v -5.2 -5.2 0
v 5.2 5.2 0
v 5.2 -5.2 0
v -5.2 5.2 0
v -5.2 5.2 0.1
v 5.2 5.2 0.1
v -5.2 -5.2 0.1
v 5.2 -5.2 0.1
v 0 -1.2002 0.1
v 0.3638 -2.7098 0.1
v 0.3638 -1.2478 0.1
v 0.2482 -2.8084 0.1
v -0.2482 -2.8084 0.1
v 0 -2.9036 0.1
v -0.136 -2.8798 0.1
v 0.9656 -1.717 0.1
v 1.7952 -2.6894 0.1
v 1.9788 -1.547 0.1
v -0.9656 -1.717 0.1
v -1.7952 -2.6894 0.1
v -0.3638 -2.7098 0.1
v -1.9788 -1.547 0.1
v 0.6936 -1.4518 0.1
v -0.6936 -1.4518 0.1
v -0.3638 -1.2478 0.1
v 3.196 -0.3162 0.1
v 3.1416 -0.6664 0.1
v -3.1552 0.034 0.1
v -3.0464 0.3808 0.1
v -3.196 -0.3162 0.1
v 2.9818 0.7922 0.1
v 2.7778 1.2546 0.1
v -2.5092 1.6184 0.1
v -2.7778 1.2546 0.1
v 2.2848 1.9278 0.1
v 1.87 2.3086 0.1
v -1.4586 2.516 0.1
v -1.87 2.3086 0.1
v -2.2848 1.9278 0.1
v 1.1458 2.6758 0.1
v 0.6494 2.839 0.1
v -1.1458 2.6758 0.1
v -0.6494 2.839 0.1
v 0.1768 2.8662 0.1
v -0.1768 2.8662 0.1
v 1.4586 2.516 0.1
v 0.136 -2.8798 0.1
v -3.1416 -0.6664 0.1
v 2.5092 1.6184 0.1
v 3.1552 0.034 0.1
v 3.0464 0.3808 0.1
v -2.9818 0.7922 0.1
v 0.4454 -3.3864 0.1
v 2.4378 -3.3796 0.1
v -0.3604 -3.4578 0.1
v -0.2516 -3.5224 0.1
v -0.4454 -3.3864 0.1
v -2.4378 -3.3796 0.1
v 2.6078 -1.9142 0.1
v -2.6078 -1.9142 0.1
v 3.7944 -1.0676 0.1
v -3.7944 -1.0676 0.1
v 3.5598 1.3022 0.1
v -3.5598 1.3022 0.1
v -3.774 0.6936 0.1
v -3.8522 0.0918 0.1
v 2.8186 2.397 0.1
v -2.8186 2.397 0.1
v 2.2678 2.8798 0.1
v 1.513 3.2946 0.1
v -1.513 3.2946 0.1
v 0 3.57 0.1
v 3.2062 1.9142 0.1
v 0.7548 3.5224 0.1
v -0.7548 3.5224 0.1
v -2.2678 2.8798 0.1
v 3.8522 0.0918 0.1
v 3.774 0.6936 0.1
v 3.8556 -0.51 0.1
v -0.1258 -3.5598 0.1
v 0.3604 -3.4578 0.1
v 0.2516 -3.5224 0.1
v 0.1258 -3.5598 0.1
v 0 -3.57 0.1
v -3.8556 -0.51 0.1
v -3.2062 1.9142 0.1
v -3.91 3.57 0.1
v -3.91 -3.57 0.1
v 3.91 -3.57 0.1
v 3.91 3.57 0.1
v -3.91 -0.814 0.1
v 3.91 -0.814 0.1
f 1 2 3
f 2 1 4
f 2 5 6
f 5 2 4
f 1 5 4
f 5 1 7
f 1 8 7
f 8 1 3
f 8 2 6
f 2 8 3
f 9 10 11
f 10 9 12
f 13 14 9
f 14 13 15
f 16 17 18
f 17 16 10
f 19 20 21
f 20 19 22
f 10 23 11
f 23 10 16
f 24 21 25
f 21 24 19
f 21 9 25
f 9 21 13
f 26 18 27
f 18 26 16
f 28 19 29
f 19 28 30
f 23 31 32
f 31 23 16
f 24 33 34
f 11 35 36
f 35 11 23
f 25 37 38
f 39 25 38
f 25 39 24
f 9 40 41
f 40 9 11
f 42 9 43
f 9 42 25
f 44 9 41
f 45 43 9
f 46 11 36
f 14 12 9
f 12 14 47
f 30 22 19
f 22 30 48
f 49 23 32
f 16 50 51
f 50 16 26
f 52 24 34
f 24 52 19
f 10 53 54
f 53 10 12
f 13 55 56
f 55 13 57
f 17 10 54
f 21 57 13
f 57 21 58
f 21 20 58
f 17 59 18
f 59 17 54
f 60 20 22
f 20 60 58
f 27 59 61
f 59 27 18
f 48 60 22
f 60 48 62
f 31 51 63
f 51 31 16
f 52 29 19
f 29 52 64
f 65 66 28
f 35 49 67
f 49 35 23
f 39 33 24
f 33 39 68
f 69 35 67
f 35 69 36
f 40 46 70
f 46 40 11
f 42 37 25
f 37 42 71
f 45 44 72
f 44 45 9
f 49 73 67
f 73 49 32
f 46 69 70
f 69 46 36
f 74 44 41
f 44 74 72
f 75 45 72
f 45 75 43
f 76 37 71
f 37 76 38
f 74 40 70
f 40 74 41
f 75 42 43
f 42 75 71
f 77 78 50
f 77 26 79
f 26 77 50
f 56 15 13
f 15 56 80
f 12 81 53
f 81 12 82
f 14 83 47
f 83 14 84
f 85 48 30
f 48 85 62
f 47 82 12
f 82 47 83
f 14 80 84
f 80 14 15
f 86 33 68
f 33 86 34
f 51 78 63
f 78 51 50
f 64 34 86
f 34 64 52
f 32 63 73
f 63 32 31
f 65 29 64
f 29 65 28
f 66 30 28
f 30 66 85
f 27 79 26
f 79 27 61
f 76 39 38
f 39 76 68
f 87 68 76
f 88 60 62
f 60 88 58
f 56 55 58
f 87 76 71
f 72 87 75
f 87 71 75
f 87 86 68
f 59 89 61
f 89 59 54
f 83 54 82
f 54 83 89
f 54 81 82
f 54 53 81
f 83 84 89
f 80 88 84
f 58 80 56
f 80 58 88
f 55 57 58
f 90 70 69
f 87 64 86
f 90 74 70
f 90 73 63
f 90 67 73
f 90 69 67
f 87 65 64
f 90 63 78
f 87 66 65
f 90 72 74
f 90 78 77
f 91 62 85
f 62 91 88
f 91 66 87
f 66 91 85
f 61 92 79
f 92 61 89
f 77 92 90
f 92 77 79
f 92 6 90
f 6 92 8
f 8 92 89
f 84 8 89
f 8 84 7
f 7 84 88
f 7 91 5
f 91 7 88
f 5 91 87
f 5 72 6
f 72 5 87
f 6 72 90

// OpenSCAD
// file: ../p/4-4edge.scad
use <../lib.scad>
$fa=1; $fs=0.2;
function ldraw_lib__4_4edge(realsolid=false) = [
// 0 Circle 1.0
// 0 Name: 4-4edge.dat
// 0 Author: James Jessiman
// 0 !LDRAW_ORG Primitive UPDATE 2017-01
// 0 !LICENSE Licensed under CC BY 2.0 and CC BY 4.0 : see CAreadme.txt
// 
// 0 BFC CERTIFY CCW
  [0,"BFC","CERTIFY"],
  [0,"BFC","CCW"],
// 
// 0 !HISTORY 1998-12-15 [PTadmin] Official Update 1998-10
// 0 !HISTORY 2005-12-28 [PTadmin] Official Update 2005-01
// 0 !HISTORY 2007-06-24 [PTadmin] Header formatted for Contributor Agreement
// 0 !HISTORY 2008-07-01 [PTadmin] Official Update 2008-01
// 0 !HISTORY 2017-01-15 [Steffen] BFCed
// 0 !HISTORY 2017-12-30 [PTadmin] Official Update 2017-01
// 
// 
// 2 24 1 0 0 0.9239 0 0.3827
  [2,24,1,0,0,0.9239,0,0.3827],
// 2 24 0.9239 0 0.3827 0.7071 0 0.7071
  [2,24,0.9239,0,0.3827,0.7071,0,0.7071],
// 2 24 0.7071 0 0.7071 0.3827 0 0.9239
  [2,24,0.7071,0,0.7071,0.3827,0,0.9239],
// 2 24 0.3827 0 0.9239 0 0 1
  [2,24,0.3827,0,0.9239,0,0,1],
// 2 24 0 0 1 -0.3827 0 0.9239
  [2,24,0,0,1,-0.3827,0,0.9239],
// 2 24 -0.3827 0 0.9239 -0.7071 0 0.7071
  [2,24,-0.3827,0,0.9239,-0.7071,0,0.7071],
// 2 24 -0.7071 0 0.7071 -0.9239 0 0.3827
  [2,24,-0.7071,0,0.7071,-0.9239,0,0.3827],
// 2 24 -0.9239 0 0.3827 -1 0 -0
  [2,24,-0.9239,0,0.3827,-1,0,-0],
// 2 24 -1 0 -0 -0.9239 0 -0.3827
  [2,24,-1,0,-0,-0.9239,0,-0.3827],
// 2 24 -0.9239 0 -0.3827 -0.7071 0 -0.7071
  [2,24,-0.9239,0,-0.3827,-0.7071,0,-0.7071],
// 2 24 -0.7071 0 -0.7071 -0.3827 0 -0.9239
  [2,24,-0.7071,0,-0.7071,-0.3827,0,-0.9239],
// 2 24 -0.3827 0 -0.9239 0 0 -1
  [2,24,-0.3827,0,-0.9239,0,0,-1],
// 2 24 0 0 -1 0.3827 0 -0.9239
  [2,24,0,0,-1,0.3827,0,-0.9239],
// 2 24 0.3827 0 -0.9239 0.7071 0 -0.7071
  [2,24,0.3827,0,-0.9239,0.7071,0,-0.7071],
// 2 24 0.7071 0 -0.7071 0.9239 0 -0.3827
  [2,24,0.7071,0,-0.7071,0.9239,0,-0.3827],
// 2 24 0.9239 0 -0.3827 1 0 0
  [2,24,0.9239,0,-0.3827,1,0,0],
];
module ldraw_lib__4_4edge(step=0, col=false, unit=2/5, alt=false, line=0.2, solid=!$preview)
    makepoly(ldraw_lib__4_4edge(solid), step=step, col=col, unit=unit, alt=alt, line=line, solid=solid);
ldraw_lib__4_4edge(line=0.2);
// file: ../p/4-4disc.scad
use <../lib.scad>
$fa=1; $fs=0.2;
function ldraw_lib__4_4disc(realsolid=false) = [
// 0 Disc 1.0
// 0 Name: 4-4disc.dat
// 0 Author: James Jessiman
// 0 !LDRAW_ORG Primitive UPDATE 2002-02
// 0 !LICENSE Licensed under CC BY 2.0 and CC BY 4.0 : see CAreadme.txt
// 
// 0 BFC CERTIFY CCW
  [0,"BFC","CERTIFY"],
  [0,"BFC","CCW"],
// 
// 0 !HISTORY 1998-12-15 [PTadmin] Official Update 1998-10
// 0 !HISTORY 2002-03-23 [sbliss] Added BFC statement
// 0 !HISTORY 2002-04-25 [PTadmin] Official Update 2002-02
// 0 !HISTORY 2007-06-24 [PTadmin] Header formatted for Contributor Agreement
// 0 !HISTORY 2008-07-01 [PTadmin] Official Update 2008-01
// 
// 
// 3 16 0 0 0 1 0 0 0.9239 0 0.3827
  [3,16,0,0,0,1,0,0,0.9239,0,0.3827],
// 3 16 0 0 0 0.9239 0 0.3827 0.7071 0 0.7071
  [3,16,0,0,0,0.9239,0,0.3827,0.7071,0,0.7071],
// 3 16 0 0 0 0.7071 0 0.7071 0.3827 0 0.9239
  [3,16,0,0,0,0.7071,0,0.7071,0.3827,0,0.9239],
// 3 16 0 0 0 0.3827 0 0.9239 0 0 1
  [3,16,0,0,0,0.3827,0,0.9239,0,0,1],
// 3 16 0 0 0 0 0 1 -0.3827 0 0.9239
  [3,16,0,0,0,0,0,1,-0.3827,0,0.9239],
// 3 16 0 0 0 -0.3827 0 0.9239 -0.7071 0 0.7071
  [3,16,0,0,0,-0.3827,0,0.9239,-0.7071,0,0.7071],
// 3 16 0 0 0 -0.7071 0 0.7071 -0.9239 0 0.3827
  [3,16,0,0,0,-0.7071,0,0.7071,-0.9239,0,0.3827],
// 3 16 0 0 0 -0.9239 0 0.3827 -1 0 -0
  [3,16,0,0,0,-0.9239,0,0.3827,-1,0,-0],
// 3 16 0 0 0 -1 0 -0 -0.9239 0 -0.3827
  [3,16,0,0,0,-1,0,-0,-0.9239,0,-0.3827],
// 3 16 0 0 0 -0.9239 0 -0.3827 -0.7071 0 -0.7071
  [3,16,0,0,0,-0.9239,0,-0.3827,-0.7071,0,-0.7071],
// 3 16 0 0 0 -0.7071 0 -0.7071 -0.3827 0 -0.9239
  [3,16,0,0,0,-0.7071,0,-0.7071,-0.3827,0,-0.9239],
// 3 16 0 0 0 -0.3827 0 -0.9239 0 0 -1
  [3,16,0,0,0,-0.3827,0,-0.9239,0,0,-1],
// 3 16 0 0 0 0 0 -1 0.3827 0 -0.9239
  [3,16,0,0,0,0,0,-1,0.3827,0,-0.9239],
// 3 16 0 0 0 0.3827 0 -0.9239 0.7071 0 -0.7071
  [3,16,0,0,0,0.3827,0,-0.9239,0.7071,0,-0.7071],
// 3 16 0 0 0 0.7071 0 -0.7071 0.9239 0 -0.3827
  [3,16,0,0,0,0.7071,0,-0.7071,0.9239,0,-0.3827],
// 3 16 0 0 0 0.9239 0 -0.3827 1 0 0
  [3,16,0,0,0,0.9239,0,-0.3827,1,0,0],
// 0
];
module ldraw_lib__4_4disc(step=0, col=false, unit=2/5, alt=false, line=0.2, solid=!$preview)
    makepoly(ldraw_lib__4_4disc(solid), step=step, col=col, unit=unit, alt=alt, line=line, solid=solid);
ldraw_lib__4_4disc(line=0.2);
// file: ../p/4-4cyli.scad
use <../lib.scad>
$fa=1; $fs=0.2;
function ldraw_lib__4_4cyli(realsolid=false) = [
// 0 Cylinder 1.0
// 0 Name: 4-4cyli.dat
// 0 Author: James Jessiman
// 0 !LDRAW_ORG Primitive UPDATE 2005-01
// 0 !LICENSE Licensed under CC BY 2.0 and CC BY 4.0 : see CAreadme.txt
// 
// 0 BFC CERTIFY CCW
  [0,"BFC","CERTIFY"],
  [0,"BFC","CCW"],
// 
// 0 !HISTORY 1998-12-15 [PTadmin] Official Update 1998-10
// 0 !HISTORY 2002-03-23 [sbliss] Added BFC statement; merged headers from files in distributions LDraw 0.27 and Complete.
// 0 !HISTORY 2002-04-25 [PTadmin] Official Update 2002-02
// 0 !HISTORY 2004-12-14 [guyvivan] BFC CCW
// 0 !HISTORY 2005-12-28 [PTadmin] Official Update 2005-01
// 0 !HISTORY 2007-06-24 [PTadmin] Header formatted for Contributor Agreement
// 0 !HISTORY 2008-07-01 [PTadmin] Official Update 2008-01
// 
// 
// 4 16 1 1 0 0.9239 1 0.3827 0.9239 0 0.3827 1 0 0
  [4,16,1,1,0,0.9239,1,0.3827,0.9239,0,0.3827,1,0,0],
// 5 24 1 0 0 1 1 0 0.9239 0 0.3827 0.9239 0 -0.3827
  [5,24,1,0,0,1,1,0,0.9239,0,0.3827,0.9239,0,-0.3827],
// 4 16 0.9239 1 0.3827 0.7071 1 0.7071 0.7071 0 0.7071 0.9239 0 0.3827
  [4,16,0.9239,1,0.3827,0.7071,1,0.7071,0.7071,0,0.7071,0.9239,0,0.3827],
// 5 24 0.9239 0 0.3827 0.9239 1 0.3827 0.7071 0 0.7071 1 0 0
  [5,24,0.9239,0,0.3827,0.9239,1,0.3827,0.7071,0,0.7071,1,0,0],
// 4 16 0.7071 1 0.7071 0.3827 1 0.9239 0.3827 0 0.9239 0.7071 0 0.7071
  [4,16,0.7071,1,0.7071,0.3827,1,0.9239,0.3827,0,0.9239,0.7071,0,0.7071],
// 5 24 0.7071 0 0.7071 0.7071 1 0.7071 0.3827 0 0.9239 0.9239 0 0.3827
  [5,24,0.7071,0,0.7071,0.7071,1,0.7071,0.3827,0,0.9239,0.9239,0,0.3827],
// 4 16 0.3827 1 0.9239 0 1 1 0 0 1 0.3827 0 0.9239
  [4,16,0.3827,1,0.9239,0,1,1,0,0,1,0.3827,0,0.9239],
// 5 24 0.3827 0 0.9239 0.3827 1 0.9239 0 0 1 0.7071 0 0.7071
  [5,24,0.3827,0,0.9239,0.3827,1,0.9239,0,0,1,0.7071,0,0.7071],
// 4 16 0 1 1 -0.3827 1 0.9239 -0.3827 0 0.9239 0 0 1
  [4,16,0,1,1,-0.3827,1,0.9239,-0.3827,0,0.9239,0,0,1],
// 5 24 0 0 1 0 1 1 -0.3827 0 0.9239 0.3827 0 0.9239
  [5,24,0,0,1,0,1,1,-0.3827,0,0.9239,0.3827,0,0.9239],
// 4 16 -0.3827 1 0.9239 -0.7071 1 0.7071 -0.7071 0 0.7071 -0.3827 0 0.9239
  [4,16,-0.3827,1,0.9239,-0.7071,1,0.7071,-0.7071,0,0.7071,-0.3827,0,0.9239],
// 5 24 -0.3827 0 0.9239 -0.3827 1 0.9239 -0.7071 0 0.7071 0 0 1
  [5,24,-0.3827,0,0.9239,-0.3827,1,0.9239,-0.7071,0,0.7071,0,0,1],
// 4 16 -0.7071 1 0.7071 -0.9239 1 0.3827 -0.9239 0 0.3827 -0.7071 0 0.7071
  [4,16,-0.7071,1,0.7071,-0.9239,1,0.3827,-0.9239,0,0.3827,-0.7071,0,0.7071],
// 5 24 -0.7071 0 0.7071 -0.7071 1 0.7071 -0.9239 0 0.3827 -0.3827 0 0.9239
  [5,24,-0.7071,0,0.7071,-0.7071,1,0.7071,-0.9239,0,0.3827,-0.3827,0,0.9239],
// 4 16 -0.9239 1 0.3827 -1 1 0 -1 0 0 -0.9239 0 0.3827
  [4,16,-0.9239,1,0.3827,-1,1,0,-1,0,0,-0.9239,0,0.3827],
// 5 24 -0.9239 0 0.3827 -0.9239 1 0.3827 -1 0 0 -0.7071 0 0.7071
  [5,24,-0.9239,0,0.3827,-0.9239,1,0.3827,-1,0,0,-0.7071,0,0.7071],
// 4 16 -1 1 0 -0.9239 1 -0.3827 -0.9239 0 -0.3827 -1 0 0
  [4,16,-1,1,0,-0.9239,1,-0.3827,-0.9239,0,-0.3827,-1,0,0],
// 5 24 -1 0 0 -1 1 0 -0.9239 0 -0.3827 -0.9239 0 0.3827
  [5,24,-1,0,0,-1,1,0,-0.9239,0,-0.3827,-0.9239,0,0.3827],
// 4 16 -0.9239 1 -0.3827 -0.7071 1 -0.7071 -0.7071 0 -0.7071 -0.9239 0 -0.3827
  [4,16,-0.9239,1,-0.3827,-0.7071,1,-0.7071,-0.7071,0,-0.7071,-0.9239,0,-0.3827],
// 5 24 -0.9239 0 -0.3827 -0.9239 1 -0.3827 -0.7071 0 -0.7071 -1 0 0
  [5,24,-0.9239,0,-0.3827,-0.9239,1,-0.3827,-0.7071,0,-0.7071,-1,0,0],
// 4 16 -0.7071 1 -0.7071 -0.3827 1 -0.9239 -0.3827 0 -0.9239 -0.7071 0 -0.7071
  [4,16,-0.7071,1,-0.7071,-0.3827,1,-0.9239,-0.3827,0,-0.9239,-0.7071,0,-0.7071],
// 5 24 -0.7071 0 -0.7071 -0.7071 1 -0.7071 -0.3827 0 -0.9239 -0.9239 0 -0.3827
  [5,24,-0.7071,0,-0.7071,-0.7071,1,-0.7071,-0.3827,0,-0.9239,-0.9239,0,-0.3827],
// 4 16 -0.3827 1 -0.9239 0 1 -1 0 0 -1 -0.3827 0 -0.9239
  [4,16,-0.3827,1,-0.9239,0,1,-1,0,0,-1,-0.3827,0,-0.9239],
// 5 24 -0.3827 0 -0.9239 -0.3827 1 -0.9239 0 0 -1 -0.7071 0 -0.7071
  [5,24,-0.3827,0,-0.9239,-0.3827,1,-0.9239,0,0,-1,-0.7071,0,-0.7071],
// 4 16 0 1 -1 0.3827 1 -0.9239 0.3827 0 -0.9239 0 0 -1
  [4,16,0,1,-1,0.3827,1,-0.9239,0.3827,0,-0.9239,0,0,-1],
// 5 24 0 0 -1 0 1 -1 0.3827 0 -0.9239 -0.3827 0 -0.9239
  [5,24,0,0,-1,0,1,-1,0.3827,0,-0.9239,-0.3827,0,-0.9239],
// 4 16 0.3827 1 -0.9239 0.7071 1 -0.7071 0.7071 0 -0.7071 0.3827 0 -0.9239
  [4,16,0.3827,1,-0.9239,0.7071,1,-0.7071,0.7071,0,-0.7071,0.3827,0,-0.9239],
// 5 24 0.3827 0 -0.9239 0.3827 1 -0.9239 0.7071 0 -0.7071 0 0 -1
  [5,24,0.3827,0,-0.9239,0.3827,1,-0.9239,0.7071,0,-0.7071,0,0,-1],
// 4 16 0.7071 1 -0.7071 0.9239 1 -0.3827 0.9239 0 -0.3827 0.7071 0 -0.7071
  [4,16,0.7071,1,-0.7071,0.9239,1,-0.3827,0.9239,0,-0.3827,0.7071,0,-0.7071],
// 5 24 0.7071 0 -0.7071 0.7071 1 -0.7071 0.9239 0 -0.3827 0.3827 0 -0.9239
  [5,24,0.7071,0,-0.7071,0.7071,1,-0.7071,0.9239,0,-0.3827,0.3827,0,-0.9239],
// 4 16 0.9239 1 -0.3827 1 1 0 1 0 0 0.9239 0 -0.3827
  [4,16,0.9239,1,-0.3827,1,1,0,1,0,0,0.9239,0,-0.3827],
// 5 24 0.9239 0 -0.3827 0.9239 1 -0.3827 1 0 0 0.7071 0 -0.7071
  [5,24,0.9239,0,-0.3827,0.9239,1,-0.3827,1,0,0,0.7071,0,-0.7071],
// 0
];
module ldraw_lib__4_4cyli(step=0, col=false, unit=2/5, alt=false, line=0.2, solid=!$preview)
    makepoly(ldraw_lib__4_4cyli(solid), step=step, col=col, unit=unit, alt=alt, line=line, solid=solid);
ldraw_lib__4_4cyli(line=0.2);
// file: ../p/stud3.scad
use <../lib.scad>
use <4-4cyli.scad>
use <4-4disc.scad>
use <4-4edge.scad>
$fa=1; $fs=0.2;
function ldraw_lib__stud3(realsolid=false) = realsolid ? 
    [openscad(translate([0,0,-eps()], o=cylinder(4+eps(), r=4)),2)] : [
// 0 Stud Tube Solid
// 0 Name: stud3.dat
// 0 Author: James Jessiman
// 0 !LDRAW_ORG Primitive UPDATE 2012-01
// 0 !LICENSE Licensed under CC BY 2.0 and CC BY 4.0 : see CAreadme.txt
// 
// 0 BFC CERTIFY CCW
  [0,"BFC","CERTIFY"],
  [0,"BFC","CCW"],
// 
// 0 !HISTORY 2002-04-04 [sbliss] Modified for BFC compliance
// 0 !HISTORY 2002-04-25 [PTadmin] Official Update 2002-02
// 0 !HISTORY 2007-06-24 [PTadmin] Header formatted for Contributor Agreement
// 0 !HISTORY 2008-07-01 [PTadmin] Official Update 2008-01
// 0 !HISTORY 2012-02-16 [Philo] Changed to CCW
// 0 !HISTORY 2012-03-30 [PTadmin] Official Update 2012-01
// 
// 
// 1 16 0 -4 0 4 0 0 0 1 0 0 0 4 4-4edge.dat
  [1,16,0,-4,0,4,0,0,0,1,0,0,0,4, ldraw_lib__4_4edge(realsolid)],
// 1 16 0 0 0 4 0 0 0 1 0 0 0 4 4-4edge.dat
  [1,16,0,0,0,4,0,0,0,1,0,0,0,4, ldraw_lib__4_4edge(realsolid)],
// 1 16 0 -4 0 4 0 0 0 1 0 0 0 4 4-4disc.dat
  [1,16,0,-4,0,4,0,0,0,1,0,0,0,4, ldraw_lib__4_4disc(realsolid)],
// 1 16 0 -4 0 4 0 0 0 4 0 0 0 4 4-4cyli.dat
  [1,16,0,-4,0,4,0,0,0,4,0,0,0,4, ldraw_lib__4_4cyli(realsolid)],
];
module ldraw_lib__stud3(step=0, col=false, unit=2/5, alt=false, line=0.2, solid=!$preview)
    makepoly(ldraw_lib__stud3(solid), step=step, col=col, unit=unit, alt=alt, line=line, solid=solid);
ldraw_lib__stud3(line=0.2);
// file: ../p/stud.scad
use <../lib.scad>
use <4-4cyli.scad>
use <4-4disc.scad>
use <4-4edge.scad>
$fa=1; $fs=0.2;
function ldraw_lib__stud(realsolid=false) = realsolid ? 
    [openscad(translate([0,0,-eps()], o=cylinder(4+eps(), r=6)),2)] : [
// 0 Stud
// 0 Name: stud.dat
// 0 Author: James Jessiman
// 0 !LDRAW_ORG Primitive UPDATE 2012-01
// 0 !LICENSE Licensed under CC BY 2.0 and CC BY 4.0 : see CAreadme.txt
// 
// 0 BFC CERTIFY CCW
  [0,"BFC","CERTIFY"],
  [0,"BFC","CCW"],
// 
// 0 !HISTORY 2002-04-04 [sbliss] Modified for BFC compliance
// 0 !HISTORY 2002-04-25 [PTadmin] Official Update 2002-02
// 0 !HISTORY 2007-06-24 [PTadmin] Header formatted for Contributor Agreement
// 0 !HISTORY 2008-07-01 [PTadmin] Official Update 2008-01
// 0 !HISTORY 2012-02-16 [Philo] Changed to CCW
// 0 !HISTORY 2012-03-30 [PTadmin] Official Update 2012-01
// 
// 
// 1 16 0 0 0 6 0 0 0 1 0 0 0 6 4-4edge.dat
  [1,16,0,0,0,6,0,0,0,1,0,0,0,6, ldraw_lib__4_4edge(realsolid)],
// 1 16 0 -4 0 6 0 0 0 1 0 0 0 6 4-4edge.dat
  [1,16,0,-4,0,6,0,0,0,1,0,0,0,6, ldraw_lib__4_4edge(realsolid)],
// 1 16 0 0 0 6 0 0 0 -4 0 0 0 6 4-4cyli.dat
  [1,16,0,0,0,6,0,0,0,-4,0,0,0,6, ldraw_lib__4_4cyli(realsolid)],
// 1 16 0 -4 0 6 0 0 0 1 0 0 0 6 4-4disc.dat
  [1,16,0,-4,0,6,0,0,0,1,0,0,0,6, ldraw_lib__4_4disc(realsolid)],
];
module ldraw_lib__stud(step=0, col=false, unit=2/5, alt=false, line=0.2, solid=!$preview)
    makepoly(ldraw_lib__stud(solid), step=step, col=col, unit=unit, alt=alt, line=line, solid=solid);
ldraw_lib__stud(line=0.2);
// file: ../p/box5.scad
use <../lib.scad>
$fa=1; $fs=0.2;
function ldraw_lib__box5(realsolid=false) = [
// 0 Box with 5 Faces and All Edges
// 0 Name: box5.dat
// 0 Author: James Jessiman
// 0 !LDRAW_ORG Primitive UPDATE 2012-01
// 0 !LICENSE Licensed under CC BY 2.0 and CC BY 4.0 : see CAreadme.txt
// 
// 0 BFC CERTIFY CCW
  [0,"BFC","CERTIFY"],
  [0,"BFC","CCW"],
// 
// 0 !HISTORY 2002-04-03 [sbliss] Modified for BFC compliance
// 0 !HISTORY 2002-04-25 [PTadmin] Official Update 2002-02
// 0 !HISTORY 2007-06-24 [PTadmin] Header formatted for Contributor Agreement
// 0 !HISTORY 2008-07-01 [PTadmin] Official Update 2008-01
// 0 !HISTORY 2012-02-16 [Philo] Changed to CCW
// 0 !HISTORY 2012-03-30 [PTadmin] Official Update 2012-01
// 
// 
// 2 24 1 1 1 -1 1 1
  [2,24,1,1,1,-1,1,1],
// 2 24 -1 1 1 -1 1 -1
  [2,24,-1,1,1,-1,1,-1],
// 2 24 -1 1 -1 1 1 -1
  [2,24,-1,1,-1,1,1,-1],
// 2 24 1 1 -1 1 1 1
  [2,24,1,1,-1,1,1,1],
// 2 24 1 0 1 -1 0 1
  [2,24,1,0,1,-1,0,1],
// 2 24 -1 0 1 -1 0 -1
  [2,24,-1,0,1,-1,0,-1],
// 2 24 -1 0 -1 1 0 -1
  [2,24,-1,0,-1,1,0,-1],
// 2 24 1 0 -1 1 0 1
  [2,24,1,0,-1,1,0,1],
// 2 24 1 0 1 1 1 1
  [2,24,1,0,1,1,1,1],
// 2 24 -1 0 1 -1 1 1
  [2,24,-1,0,1,-1,1,1],
// 2 24 1 0 -1 1 1 -1
  [2,24,1,0,-1,1,1,-1],
// 2 24 -1 0 -1 -1 1 -1
  [2,24,-1,0,-1,-1,1,-1],
// 4 16 -1 1 1 1 1 1 1 1 -1 -1 1 -1
  [4,16,-1,1,1,1,1,1,1,1,-1,-1,1,-1],
// 4 16 -1 1 1 -1 0 1 1 0 1 1 1 1
  [4,16,-1,1,1,-1,0,1,1,0,1,1,1,1],
// 4 16 -1 1 -1 -1 0 -1 -1 0 1 -1 1 1
  [4,16,-1,1,-1,-1,0,-1,-1,0,1,-1,1,1],
// 4 16 1 1 -1 1 0 -1 -1 0 -1 -1 1 -1
  [4,16,1,1,-1,1,0,-1,-1,0,-1,-1,1,-1],
// 4 16 1 1 1 1 0 1 1 0 -1 1 1 -1
  [4,16,1,1,1,1,0,1,1,0,-1,1,1,-1],
];
module ldraw_lib__box5(step=0, col=false, unit=2/5, alt=false, line=0.2, solid=!$preview)
    makepoly(ldraw_lib__box5(solid), step=step, col=col, unit=unit, alt=alt, line=line, solid=solid);
ldraw_lib__box5(line=0.2);
// file: ../p/box4t.scad
use <../lib.scad>
$fa=1; $fs=0.2;
function ldraw_lib__box4t(realsolid=false) = [
// 0 Box with 4 Adjacent Faces and All Edges
// 0 Name: box4t.dat
// 0 Author: Tore Eriksson [Tore_Eriksson]
// 0 !LDRAW_ORG Primitive UPDATE 2003-02
// 0 !LICENSE Licensed under CC BY 2.0 and CC BY 4.0 : see CAreadme.txt
// 
// 0 BFC CERTIFY CCW
  [0,"BFC","CERTIFY"],
  [0,"BFC","CCW"],
// 
// 0 !HISTORY 1997-09-29 [PTadmin] Official Update 1997-15
// 0 !HISTORY 2002-08-31 [izanette] Modified with WINDZ for BFC compliance
// 0 !HISTORY 2003-08-01 [PTadmin] Official Update 2003-02
// 0 !HISTORY 2007-06-24 [PTadmin] Header formatted for Contributor Agreement
// 0 !HISTORY 2008-07-01 [PTadmin] Official Update 2008-01
// 
// 
// 2 24 1 1 1 -1 1 1
  [2,24,1,1,1,-1,1,1],
// 2 24 -1 1 1 -1 1 -1
  [2,24,-1,1,1,-1,1,-1],
// 2 24 -1 1 -1 1 1 -1
  [2,24,-1,1,-1,1,1,-1],
// 2 24 1 1 -1 1 1 1
  [2,24,1,1,-1,1,1,1],
// 2 24 1 0 1 -1 0 1
  [2,24,1,0,1,-1,0,1],
// 2 24 -1 0 1 -1 0 -1
  [2,24,-1,0,1,-1,0,-1],
// 2 24 -1 0 -1 1 0 -1
  [2,24,-1,0,-1,1,0,-1],
// 2 24 1 0 -1 1 0 1
  [2,24,1,0,-1,1,0,1],
// 2 24 1 0 1 1 1 1
  [2,24,1,0,1,1,1,1],
// 2 24 -1 0 1 -1 1 1
  [2,24,-1,0,1,-1,1,1],
// 2 24 1 0 -1 1 1 -1
  [2,24,1,0,-1,1,1,-1],
// 2 24 -1 0 -1 -1 1 -1
  [2,24,-1,0,-1,-1,1,-1],
// 4 16 1 1 1 1 1 -1 -1 1 -1 -1 1 1
  [4,16,1,1,1,1,1,-1,-1,1,-1,-1,1,1],
// 4 16 1 1 1 -1 1 1 -1 0 1 1 0 1
  [4,16,1,1,1,-1,1,1,-1,0,1,1,0,1],
// 4 16 -1 1 1 -1 1 -1 -1 0 -1 -1 0 1
  [4,16,-1,1,1,-1,1,-1,-1,0,-1,-1,0,1],
// 0 4 16 -1 1 -1 -1 0 -1 1 0 -1 1 1 -1
// 4 16 1 1 -1 1 1 1 1 0 1 1 0 -1
  [4,16,1,1,-1,1,1,1,1,0,1,1,0,-1],
// 0
];
module ldraw_lib__box4t(step=0, col=false, unit=2/5, alt=false, line=0.2, solid=!$preview)
    makepoly(ldraw_lib__box4t(solid), step=step, col=col, unit=unit, alt=alt, line=line, solid=solid);
ldraw_lib__box4t(line=0.2);
// file: s/3004s01.scad
use <../../lib.scad>
use <../../p/box4t.scad>
use <../../p/box5.scad>
use <../../p/stud.scad>
use <../../p/stud3.scad>
$fa=1; $fs=0.2;
function ldraw_lib__s__3004s01(realsolid=false) = [
// 0 ~Brick  1 x  2 without Front Face
// 0 Name: s\3004s01.dat
// 0 Author: James Jessiman
// 0 !LDRAW_ORG Subpart UPDATE 2003-03
// 0 !LICENSE Licensed under CC BY 2.0 and CC BY 4.0 : see CAreadme.txt
// 
// 0 BFC CERTIFY CCW
  [0,"BFC","CERTIFY"],
  [0,"BFC","CCW"],
// 
// 0 !HISTORY 2003-09-07 [jriley] Subfiling, BFC
// 0 !HISTORY 2003-12-19 [PTadmin] Official Update 2003-03
// 0 !HISTORY 2007-08-29 [PTadmin] Header formatted for Contributor Agreement
// 0 !HISTORY 2008-07-01 [PTadmin] Official Update 2008-01
// 
// 
// 1 16 0 4 0 1 0 0 0 -5 0 0 0 1 stud3.dat
  [1,16,0,4,0,1,0,0,0,-5,0,0,0,1, ldraw_lib__stud3(realsolid)],
// 0 BFC INVERTNEXT
  [0,"BFC","INVERTNEXT"],
// 1 16 0 24 0 16 0 0 0 -20 0 0 0 6 box5.dat
  [1,16,0,24,0,16,0,0,0,-20,0,0,0,6, ldraw_lib__box5(realsolid)],
// 4 16 20 24 10 16 24 6 -16 24 6 -20 24 10
  [4,16,20,24,10,16,24,6,-16,24,6,-20,24,10],
// 4 16 -20 24 10 -16 24 6 -16 24 -6 -20 24 -10
  [4,16,-20,24,10,-16,24,6,-16,24,-6,-20,24,-10],
// 4 16 -20 24 -10 -16 24 -6 16 24 -6 20 24 -10
  [4,16,-20,24,-10,-16,24,-6,16,24,-6,20,24,-10],
// 4 16 20 24 -10 16 24 -6 16 24 6 20 24 10
  [4,16,20,24,-10,16,24,-6,16,24,6,20,24,10],
// 1 16 0 24 0 20 0 0 0 -24 0 0 0 10 box4t.dat
  [1,16,0,24,0,20,0,0,0,-24,0,0,0,10, ldraw_lib__box4t(realsolid)],
// 1 16 10 0 0 1 0 0 0 1 0 0 0 1 stud.dat
  [1,16,10,0,0,1,0,0,0,1,0,0,0,1, ldraw_lib__stud(realsolid)],
// 1 16 -10 0 0 1 0 0 0 1 0 0 0 1 stud.dat
  [1,16,-10,0,0,1,0,0,0,1,0,0,0,1, ldraw_lib__stud(realsolid)],
// 0
];
module ldraw_lib__s__3004s01(step=0, col=false, unit=2/5, alt=false, line=0.2, solid=!$preview)
    makepoly(ldraw_lib__s__3004s01(solid), step=step, col=col, unit=unit, alt=alt, line=line, solid=solid);
ldraw_lib__s__3004s01(line=0.2);
// file: 3004.scad
use <../lib.scad>
use <s/3004s01.scad>
$fa=1; $fs=0.2;
function ldraw_lib__3004(realsolid=false) = [
// 0 Brick  1 x  2
// 0 Name: 3004.dat
// 0 Author: James Jessiman
// 0 !LDRAW_ORG Part UPDATE 2022-05
// 0 !LICENSE Licensed under CC BY 2.0 and CC BY 4.0 : see CAreadme.txt
// 
// 0 BFC CERTIFY CCW
  [0,"BFC","CERTIFY"],
  [0,"BFC","CCW"],
// 
// 0 !HISTORY 2001-10-26 [PTadmin] Official Update 2001-01
// 0 !HISTORY 2002-05-07 {unknown} BFC Certification
// 0 !HISTORY 2002-06-11 [PTadmin] Official Update 2002-03
// 0 !HISTORY 2007-05-07 [PTadmin] Header formatted for Contributor Agreement
// 0 !HISTORY 2008-07-01 [PTadmin] Official Update 2008-01
// 0 !HISTORY 2022-08-04 [MagFors] Using subfile
// 0 !HISTORY 2022-09-15 [PTadmin] Official Update 2022-05
// 
// 
// 1 16 0 0 0 1 0 0 0 1 0 0 0 1 s\3004s01.dat
  [1,16,0,0,0,1,0,0,0,1,0,0,0,1, ldraw_lib__s__3004s01(realsolid)],
// 4 16 -20 24 -10 20 24 -10 20 0 -10 -20 0 -10
  [4,16,-20,24,-10,20,24,-10,20,0,-10,-20,0,-10],
];
module ldraw_lib__3004(step=0, col=false, unit=2/5, alt=false, line=0.2, solid=!$preview)
    makepoly(ldraw_lib__3004(solid), step=step, col=col, unit=unit, alt=alt, line=line, solid=solid);
ldraw_lib__3004(line=0.2);
// file: ../p/box5-12.scad
use <../lib.scad>
$fa=1; $fs=0.2;
function ldraw_lib__box5_12(realsolid=false) = [
// 0 Box with 5 Faces without Any Edges
// 0 Name: box5-12.dat
// 0 Author: Chris Dee [cwdee]
// 0 !LDRAW_ORG Primitive UPDATE 2009-02
// 0 !LICENSE Licensed under CC BY 2.0 and CC BY 4.0 : see CAreadme.txt
// 
// 0 BFC CERTIFY CCW
  [0,"BFC","CERTIFY"],
  [0,"BFC","CCW"],
// 
// 0 !HISTORY 2009-09-03 [PTadmin] Official Update 2009-02
// 
// 
// 4 16 1 1 1 1 1 -1 -1 1 -1 -1 1 1
  [4,16,1,1,1,1,1,-1,-1,1,-1,-1,1,1],
// 4 16 -1 0 1 1 0 1 1 1 1 -1 1 1
  [4,16,-1,0,1,1,0,1,1,1,1,-1,1,1],
// 4 16 -1 0 -1 -1 0 1 -1 1 1 -1 1 -1
  [4,16,-1,0,-1,-1,0,1,-1,1,1,-1,1,-1],
// 4 16 1 0 -1 -1 0 -1 -1 1 -1 1 1 -1
  [4,16,1,0,-1,-1,0,-1,-1,1,-1,1,1,-1],
// 4 16 1 0 1 1 0 -1 1 1 -1 1 1 1
  [4,16,1,0,1,1,0,-1,1,1,-1,1,1,1],
// 0
];
module ldraw_lib__box5_12(step=0, col=false, unit=2/5, alt=false, line=0.2, solid=!$preview)
    makepoly(ldraw_lib__box5_12(solid), step=step, col=col, unit=unit, alt=alt, line=line, solid=solid);
ldraw_lib__box5_12(line=0.2);
// main file
use <../lib.scad>
use <../p/box5-12.scad>
use <s/3004s60.scad>
$fa=1; $fs=0.2;
function ldraw_lib__003605d(realsolid=false) = [
// 0 Sticker  1.3 x  1.3 with Shell Logo 1971
// 0 Name: 003605d.dat
// 0 Author: Willy Tschager [Holly-Wood]
// 0 !LDRAW_ORG Part UPDATE 2022-01
// 0 !LICENSE Licensed under CC BY 2.0 and CC BY 4.0 : see CAreadme.txt
// 
// 0 BFC CERTIFY CCW
  [0,"BFC","CERTIFY"],
  [0,"BFC","CCW"],
// 
// 0 !KEYWORDS company, drilling, offshore, oil, platform, rig, set 373, tanker
// 
// 0 !HISTORY 2022-01-14 [PTadmin] Official Update 2022-01
// 
// 
// 0 // Small box
// 1 16 0 -.25 0 13 0 0 0 .25 0 0 0 13 box5-12.dat
  [1,16,0,-.25,0,13,0,0,0,.25,0,0,0,13, ldraw_lib__box5_12(realsolid)],
// 
// 0 // Pattern
// 1 15 0 -.25 0 .85 0 0 0 0 1 0 -.85 0 s\3004s60.dat
  [1,15,0,-.25,0,.85,0,0,0,0,1,0,-.85,0, ldraw_lib__s__3004s60(realsolid)],
// 
// 4 15 13 -.25 -13 13 -.25 13 9.775 -.25 8.925 9.775 -.25 -2.0349
  [4,15,13,-.25,-13,13,-.25,13,9.775,-.25,8.925,9.775,-.25,-2.0349],
// 3 15 13 -.25 -13 9.775 -.25 -2.0349 9.775 -.25 -8.925
  [3,15,13,-.25,-13,9.775,-.25,-2.0349,9.775,-.25,-8.925],
// 4 15 9.775 -.25 -8.925 0 -.25 -8.925 -13 -.25 -13 13 -.25 -13
  [4,15,9.775,-.25,-8.925,0,-.25,-8.925,-13,-.25,-13,13,-.25,-13],
// 3 15 -13 -.25 -13 0 -.25 -8.925 -9.775 -.25 -8.925
  [3,15,-13,-.25,-13,0,-.25,-8.925,-9.775,-.25,-8.925],
// 4 15 -13 -.25 13 -13 -.25 -13 -9.775 -.25 -8.925 -9.775 -.25 -2.0349
  [4,15,-13,-.25,13,-13,-.25,-13,-9.775,-.25,-8.925,-9.775,-.25,-2.0349],
// 3 15 -13 -.25 13 -9.775 -.25 -2.0349 -9.775 -.25 8.925
  [3,15,-13,-.25,13,-9.775,-.25,-2.0349,-9.775,-.25,8.925],
// 4 15 -9.775 -.25 8.925 0 -.25 8.925 13 -.25 13 -13 -.25 13
  [4,15,-9.775,-.25,8.925,0,-.25,8.925,13,-.25,13,-13,-.25,13],
// 3 15 13 -.25 13 0 -.25 8.925 9.775 -.25 8.925
  [3,15,13,-.25,13,0,-.25,8.925,9.775,-.25,8.925],
];
module ldraw_lib__003605d(step=0, col=false, unit=2/5, alt=false, line=0.2, solid=!$preview)
    makepoly(ldraw_lib__003605d(solid), step=step, col=col, unit=unit, alt=alt, line=line, solid=solid);
ldraw_lib__003605d(line=0.2);
